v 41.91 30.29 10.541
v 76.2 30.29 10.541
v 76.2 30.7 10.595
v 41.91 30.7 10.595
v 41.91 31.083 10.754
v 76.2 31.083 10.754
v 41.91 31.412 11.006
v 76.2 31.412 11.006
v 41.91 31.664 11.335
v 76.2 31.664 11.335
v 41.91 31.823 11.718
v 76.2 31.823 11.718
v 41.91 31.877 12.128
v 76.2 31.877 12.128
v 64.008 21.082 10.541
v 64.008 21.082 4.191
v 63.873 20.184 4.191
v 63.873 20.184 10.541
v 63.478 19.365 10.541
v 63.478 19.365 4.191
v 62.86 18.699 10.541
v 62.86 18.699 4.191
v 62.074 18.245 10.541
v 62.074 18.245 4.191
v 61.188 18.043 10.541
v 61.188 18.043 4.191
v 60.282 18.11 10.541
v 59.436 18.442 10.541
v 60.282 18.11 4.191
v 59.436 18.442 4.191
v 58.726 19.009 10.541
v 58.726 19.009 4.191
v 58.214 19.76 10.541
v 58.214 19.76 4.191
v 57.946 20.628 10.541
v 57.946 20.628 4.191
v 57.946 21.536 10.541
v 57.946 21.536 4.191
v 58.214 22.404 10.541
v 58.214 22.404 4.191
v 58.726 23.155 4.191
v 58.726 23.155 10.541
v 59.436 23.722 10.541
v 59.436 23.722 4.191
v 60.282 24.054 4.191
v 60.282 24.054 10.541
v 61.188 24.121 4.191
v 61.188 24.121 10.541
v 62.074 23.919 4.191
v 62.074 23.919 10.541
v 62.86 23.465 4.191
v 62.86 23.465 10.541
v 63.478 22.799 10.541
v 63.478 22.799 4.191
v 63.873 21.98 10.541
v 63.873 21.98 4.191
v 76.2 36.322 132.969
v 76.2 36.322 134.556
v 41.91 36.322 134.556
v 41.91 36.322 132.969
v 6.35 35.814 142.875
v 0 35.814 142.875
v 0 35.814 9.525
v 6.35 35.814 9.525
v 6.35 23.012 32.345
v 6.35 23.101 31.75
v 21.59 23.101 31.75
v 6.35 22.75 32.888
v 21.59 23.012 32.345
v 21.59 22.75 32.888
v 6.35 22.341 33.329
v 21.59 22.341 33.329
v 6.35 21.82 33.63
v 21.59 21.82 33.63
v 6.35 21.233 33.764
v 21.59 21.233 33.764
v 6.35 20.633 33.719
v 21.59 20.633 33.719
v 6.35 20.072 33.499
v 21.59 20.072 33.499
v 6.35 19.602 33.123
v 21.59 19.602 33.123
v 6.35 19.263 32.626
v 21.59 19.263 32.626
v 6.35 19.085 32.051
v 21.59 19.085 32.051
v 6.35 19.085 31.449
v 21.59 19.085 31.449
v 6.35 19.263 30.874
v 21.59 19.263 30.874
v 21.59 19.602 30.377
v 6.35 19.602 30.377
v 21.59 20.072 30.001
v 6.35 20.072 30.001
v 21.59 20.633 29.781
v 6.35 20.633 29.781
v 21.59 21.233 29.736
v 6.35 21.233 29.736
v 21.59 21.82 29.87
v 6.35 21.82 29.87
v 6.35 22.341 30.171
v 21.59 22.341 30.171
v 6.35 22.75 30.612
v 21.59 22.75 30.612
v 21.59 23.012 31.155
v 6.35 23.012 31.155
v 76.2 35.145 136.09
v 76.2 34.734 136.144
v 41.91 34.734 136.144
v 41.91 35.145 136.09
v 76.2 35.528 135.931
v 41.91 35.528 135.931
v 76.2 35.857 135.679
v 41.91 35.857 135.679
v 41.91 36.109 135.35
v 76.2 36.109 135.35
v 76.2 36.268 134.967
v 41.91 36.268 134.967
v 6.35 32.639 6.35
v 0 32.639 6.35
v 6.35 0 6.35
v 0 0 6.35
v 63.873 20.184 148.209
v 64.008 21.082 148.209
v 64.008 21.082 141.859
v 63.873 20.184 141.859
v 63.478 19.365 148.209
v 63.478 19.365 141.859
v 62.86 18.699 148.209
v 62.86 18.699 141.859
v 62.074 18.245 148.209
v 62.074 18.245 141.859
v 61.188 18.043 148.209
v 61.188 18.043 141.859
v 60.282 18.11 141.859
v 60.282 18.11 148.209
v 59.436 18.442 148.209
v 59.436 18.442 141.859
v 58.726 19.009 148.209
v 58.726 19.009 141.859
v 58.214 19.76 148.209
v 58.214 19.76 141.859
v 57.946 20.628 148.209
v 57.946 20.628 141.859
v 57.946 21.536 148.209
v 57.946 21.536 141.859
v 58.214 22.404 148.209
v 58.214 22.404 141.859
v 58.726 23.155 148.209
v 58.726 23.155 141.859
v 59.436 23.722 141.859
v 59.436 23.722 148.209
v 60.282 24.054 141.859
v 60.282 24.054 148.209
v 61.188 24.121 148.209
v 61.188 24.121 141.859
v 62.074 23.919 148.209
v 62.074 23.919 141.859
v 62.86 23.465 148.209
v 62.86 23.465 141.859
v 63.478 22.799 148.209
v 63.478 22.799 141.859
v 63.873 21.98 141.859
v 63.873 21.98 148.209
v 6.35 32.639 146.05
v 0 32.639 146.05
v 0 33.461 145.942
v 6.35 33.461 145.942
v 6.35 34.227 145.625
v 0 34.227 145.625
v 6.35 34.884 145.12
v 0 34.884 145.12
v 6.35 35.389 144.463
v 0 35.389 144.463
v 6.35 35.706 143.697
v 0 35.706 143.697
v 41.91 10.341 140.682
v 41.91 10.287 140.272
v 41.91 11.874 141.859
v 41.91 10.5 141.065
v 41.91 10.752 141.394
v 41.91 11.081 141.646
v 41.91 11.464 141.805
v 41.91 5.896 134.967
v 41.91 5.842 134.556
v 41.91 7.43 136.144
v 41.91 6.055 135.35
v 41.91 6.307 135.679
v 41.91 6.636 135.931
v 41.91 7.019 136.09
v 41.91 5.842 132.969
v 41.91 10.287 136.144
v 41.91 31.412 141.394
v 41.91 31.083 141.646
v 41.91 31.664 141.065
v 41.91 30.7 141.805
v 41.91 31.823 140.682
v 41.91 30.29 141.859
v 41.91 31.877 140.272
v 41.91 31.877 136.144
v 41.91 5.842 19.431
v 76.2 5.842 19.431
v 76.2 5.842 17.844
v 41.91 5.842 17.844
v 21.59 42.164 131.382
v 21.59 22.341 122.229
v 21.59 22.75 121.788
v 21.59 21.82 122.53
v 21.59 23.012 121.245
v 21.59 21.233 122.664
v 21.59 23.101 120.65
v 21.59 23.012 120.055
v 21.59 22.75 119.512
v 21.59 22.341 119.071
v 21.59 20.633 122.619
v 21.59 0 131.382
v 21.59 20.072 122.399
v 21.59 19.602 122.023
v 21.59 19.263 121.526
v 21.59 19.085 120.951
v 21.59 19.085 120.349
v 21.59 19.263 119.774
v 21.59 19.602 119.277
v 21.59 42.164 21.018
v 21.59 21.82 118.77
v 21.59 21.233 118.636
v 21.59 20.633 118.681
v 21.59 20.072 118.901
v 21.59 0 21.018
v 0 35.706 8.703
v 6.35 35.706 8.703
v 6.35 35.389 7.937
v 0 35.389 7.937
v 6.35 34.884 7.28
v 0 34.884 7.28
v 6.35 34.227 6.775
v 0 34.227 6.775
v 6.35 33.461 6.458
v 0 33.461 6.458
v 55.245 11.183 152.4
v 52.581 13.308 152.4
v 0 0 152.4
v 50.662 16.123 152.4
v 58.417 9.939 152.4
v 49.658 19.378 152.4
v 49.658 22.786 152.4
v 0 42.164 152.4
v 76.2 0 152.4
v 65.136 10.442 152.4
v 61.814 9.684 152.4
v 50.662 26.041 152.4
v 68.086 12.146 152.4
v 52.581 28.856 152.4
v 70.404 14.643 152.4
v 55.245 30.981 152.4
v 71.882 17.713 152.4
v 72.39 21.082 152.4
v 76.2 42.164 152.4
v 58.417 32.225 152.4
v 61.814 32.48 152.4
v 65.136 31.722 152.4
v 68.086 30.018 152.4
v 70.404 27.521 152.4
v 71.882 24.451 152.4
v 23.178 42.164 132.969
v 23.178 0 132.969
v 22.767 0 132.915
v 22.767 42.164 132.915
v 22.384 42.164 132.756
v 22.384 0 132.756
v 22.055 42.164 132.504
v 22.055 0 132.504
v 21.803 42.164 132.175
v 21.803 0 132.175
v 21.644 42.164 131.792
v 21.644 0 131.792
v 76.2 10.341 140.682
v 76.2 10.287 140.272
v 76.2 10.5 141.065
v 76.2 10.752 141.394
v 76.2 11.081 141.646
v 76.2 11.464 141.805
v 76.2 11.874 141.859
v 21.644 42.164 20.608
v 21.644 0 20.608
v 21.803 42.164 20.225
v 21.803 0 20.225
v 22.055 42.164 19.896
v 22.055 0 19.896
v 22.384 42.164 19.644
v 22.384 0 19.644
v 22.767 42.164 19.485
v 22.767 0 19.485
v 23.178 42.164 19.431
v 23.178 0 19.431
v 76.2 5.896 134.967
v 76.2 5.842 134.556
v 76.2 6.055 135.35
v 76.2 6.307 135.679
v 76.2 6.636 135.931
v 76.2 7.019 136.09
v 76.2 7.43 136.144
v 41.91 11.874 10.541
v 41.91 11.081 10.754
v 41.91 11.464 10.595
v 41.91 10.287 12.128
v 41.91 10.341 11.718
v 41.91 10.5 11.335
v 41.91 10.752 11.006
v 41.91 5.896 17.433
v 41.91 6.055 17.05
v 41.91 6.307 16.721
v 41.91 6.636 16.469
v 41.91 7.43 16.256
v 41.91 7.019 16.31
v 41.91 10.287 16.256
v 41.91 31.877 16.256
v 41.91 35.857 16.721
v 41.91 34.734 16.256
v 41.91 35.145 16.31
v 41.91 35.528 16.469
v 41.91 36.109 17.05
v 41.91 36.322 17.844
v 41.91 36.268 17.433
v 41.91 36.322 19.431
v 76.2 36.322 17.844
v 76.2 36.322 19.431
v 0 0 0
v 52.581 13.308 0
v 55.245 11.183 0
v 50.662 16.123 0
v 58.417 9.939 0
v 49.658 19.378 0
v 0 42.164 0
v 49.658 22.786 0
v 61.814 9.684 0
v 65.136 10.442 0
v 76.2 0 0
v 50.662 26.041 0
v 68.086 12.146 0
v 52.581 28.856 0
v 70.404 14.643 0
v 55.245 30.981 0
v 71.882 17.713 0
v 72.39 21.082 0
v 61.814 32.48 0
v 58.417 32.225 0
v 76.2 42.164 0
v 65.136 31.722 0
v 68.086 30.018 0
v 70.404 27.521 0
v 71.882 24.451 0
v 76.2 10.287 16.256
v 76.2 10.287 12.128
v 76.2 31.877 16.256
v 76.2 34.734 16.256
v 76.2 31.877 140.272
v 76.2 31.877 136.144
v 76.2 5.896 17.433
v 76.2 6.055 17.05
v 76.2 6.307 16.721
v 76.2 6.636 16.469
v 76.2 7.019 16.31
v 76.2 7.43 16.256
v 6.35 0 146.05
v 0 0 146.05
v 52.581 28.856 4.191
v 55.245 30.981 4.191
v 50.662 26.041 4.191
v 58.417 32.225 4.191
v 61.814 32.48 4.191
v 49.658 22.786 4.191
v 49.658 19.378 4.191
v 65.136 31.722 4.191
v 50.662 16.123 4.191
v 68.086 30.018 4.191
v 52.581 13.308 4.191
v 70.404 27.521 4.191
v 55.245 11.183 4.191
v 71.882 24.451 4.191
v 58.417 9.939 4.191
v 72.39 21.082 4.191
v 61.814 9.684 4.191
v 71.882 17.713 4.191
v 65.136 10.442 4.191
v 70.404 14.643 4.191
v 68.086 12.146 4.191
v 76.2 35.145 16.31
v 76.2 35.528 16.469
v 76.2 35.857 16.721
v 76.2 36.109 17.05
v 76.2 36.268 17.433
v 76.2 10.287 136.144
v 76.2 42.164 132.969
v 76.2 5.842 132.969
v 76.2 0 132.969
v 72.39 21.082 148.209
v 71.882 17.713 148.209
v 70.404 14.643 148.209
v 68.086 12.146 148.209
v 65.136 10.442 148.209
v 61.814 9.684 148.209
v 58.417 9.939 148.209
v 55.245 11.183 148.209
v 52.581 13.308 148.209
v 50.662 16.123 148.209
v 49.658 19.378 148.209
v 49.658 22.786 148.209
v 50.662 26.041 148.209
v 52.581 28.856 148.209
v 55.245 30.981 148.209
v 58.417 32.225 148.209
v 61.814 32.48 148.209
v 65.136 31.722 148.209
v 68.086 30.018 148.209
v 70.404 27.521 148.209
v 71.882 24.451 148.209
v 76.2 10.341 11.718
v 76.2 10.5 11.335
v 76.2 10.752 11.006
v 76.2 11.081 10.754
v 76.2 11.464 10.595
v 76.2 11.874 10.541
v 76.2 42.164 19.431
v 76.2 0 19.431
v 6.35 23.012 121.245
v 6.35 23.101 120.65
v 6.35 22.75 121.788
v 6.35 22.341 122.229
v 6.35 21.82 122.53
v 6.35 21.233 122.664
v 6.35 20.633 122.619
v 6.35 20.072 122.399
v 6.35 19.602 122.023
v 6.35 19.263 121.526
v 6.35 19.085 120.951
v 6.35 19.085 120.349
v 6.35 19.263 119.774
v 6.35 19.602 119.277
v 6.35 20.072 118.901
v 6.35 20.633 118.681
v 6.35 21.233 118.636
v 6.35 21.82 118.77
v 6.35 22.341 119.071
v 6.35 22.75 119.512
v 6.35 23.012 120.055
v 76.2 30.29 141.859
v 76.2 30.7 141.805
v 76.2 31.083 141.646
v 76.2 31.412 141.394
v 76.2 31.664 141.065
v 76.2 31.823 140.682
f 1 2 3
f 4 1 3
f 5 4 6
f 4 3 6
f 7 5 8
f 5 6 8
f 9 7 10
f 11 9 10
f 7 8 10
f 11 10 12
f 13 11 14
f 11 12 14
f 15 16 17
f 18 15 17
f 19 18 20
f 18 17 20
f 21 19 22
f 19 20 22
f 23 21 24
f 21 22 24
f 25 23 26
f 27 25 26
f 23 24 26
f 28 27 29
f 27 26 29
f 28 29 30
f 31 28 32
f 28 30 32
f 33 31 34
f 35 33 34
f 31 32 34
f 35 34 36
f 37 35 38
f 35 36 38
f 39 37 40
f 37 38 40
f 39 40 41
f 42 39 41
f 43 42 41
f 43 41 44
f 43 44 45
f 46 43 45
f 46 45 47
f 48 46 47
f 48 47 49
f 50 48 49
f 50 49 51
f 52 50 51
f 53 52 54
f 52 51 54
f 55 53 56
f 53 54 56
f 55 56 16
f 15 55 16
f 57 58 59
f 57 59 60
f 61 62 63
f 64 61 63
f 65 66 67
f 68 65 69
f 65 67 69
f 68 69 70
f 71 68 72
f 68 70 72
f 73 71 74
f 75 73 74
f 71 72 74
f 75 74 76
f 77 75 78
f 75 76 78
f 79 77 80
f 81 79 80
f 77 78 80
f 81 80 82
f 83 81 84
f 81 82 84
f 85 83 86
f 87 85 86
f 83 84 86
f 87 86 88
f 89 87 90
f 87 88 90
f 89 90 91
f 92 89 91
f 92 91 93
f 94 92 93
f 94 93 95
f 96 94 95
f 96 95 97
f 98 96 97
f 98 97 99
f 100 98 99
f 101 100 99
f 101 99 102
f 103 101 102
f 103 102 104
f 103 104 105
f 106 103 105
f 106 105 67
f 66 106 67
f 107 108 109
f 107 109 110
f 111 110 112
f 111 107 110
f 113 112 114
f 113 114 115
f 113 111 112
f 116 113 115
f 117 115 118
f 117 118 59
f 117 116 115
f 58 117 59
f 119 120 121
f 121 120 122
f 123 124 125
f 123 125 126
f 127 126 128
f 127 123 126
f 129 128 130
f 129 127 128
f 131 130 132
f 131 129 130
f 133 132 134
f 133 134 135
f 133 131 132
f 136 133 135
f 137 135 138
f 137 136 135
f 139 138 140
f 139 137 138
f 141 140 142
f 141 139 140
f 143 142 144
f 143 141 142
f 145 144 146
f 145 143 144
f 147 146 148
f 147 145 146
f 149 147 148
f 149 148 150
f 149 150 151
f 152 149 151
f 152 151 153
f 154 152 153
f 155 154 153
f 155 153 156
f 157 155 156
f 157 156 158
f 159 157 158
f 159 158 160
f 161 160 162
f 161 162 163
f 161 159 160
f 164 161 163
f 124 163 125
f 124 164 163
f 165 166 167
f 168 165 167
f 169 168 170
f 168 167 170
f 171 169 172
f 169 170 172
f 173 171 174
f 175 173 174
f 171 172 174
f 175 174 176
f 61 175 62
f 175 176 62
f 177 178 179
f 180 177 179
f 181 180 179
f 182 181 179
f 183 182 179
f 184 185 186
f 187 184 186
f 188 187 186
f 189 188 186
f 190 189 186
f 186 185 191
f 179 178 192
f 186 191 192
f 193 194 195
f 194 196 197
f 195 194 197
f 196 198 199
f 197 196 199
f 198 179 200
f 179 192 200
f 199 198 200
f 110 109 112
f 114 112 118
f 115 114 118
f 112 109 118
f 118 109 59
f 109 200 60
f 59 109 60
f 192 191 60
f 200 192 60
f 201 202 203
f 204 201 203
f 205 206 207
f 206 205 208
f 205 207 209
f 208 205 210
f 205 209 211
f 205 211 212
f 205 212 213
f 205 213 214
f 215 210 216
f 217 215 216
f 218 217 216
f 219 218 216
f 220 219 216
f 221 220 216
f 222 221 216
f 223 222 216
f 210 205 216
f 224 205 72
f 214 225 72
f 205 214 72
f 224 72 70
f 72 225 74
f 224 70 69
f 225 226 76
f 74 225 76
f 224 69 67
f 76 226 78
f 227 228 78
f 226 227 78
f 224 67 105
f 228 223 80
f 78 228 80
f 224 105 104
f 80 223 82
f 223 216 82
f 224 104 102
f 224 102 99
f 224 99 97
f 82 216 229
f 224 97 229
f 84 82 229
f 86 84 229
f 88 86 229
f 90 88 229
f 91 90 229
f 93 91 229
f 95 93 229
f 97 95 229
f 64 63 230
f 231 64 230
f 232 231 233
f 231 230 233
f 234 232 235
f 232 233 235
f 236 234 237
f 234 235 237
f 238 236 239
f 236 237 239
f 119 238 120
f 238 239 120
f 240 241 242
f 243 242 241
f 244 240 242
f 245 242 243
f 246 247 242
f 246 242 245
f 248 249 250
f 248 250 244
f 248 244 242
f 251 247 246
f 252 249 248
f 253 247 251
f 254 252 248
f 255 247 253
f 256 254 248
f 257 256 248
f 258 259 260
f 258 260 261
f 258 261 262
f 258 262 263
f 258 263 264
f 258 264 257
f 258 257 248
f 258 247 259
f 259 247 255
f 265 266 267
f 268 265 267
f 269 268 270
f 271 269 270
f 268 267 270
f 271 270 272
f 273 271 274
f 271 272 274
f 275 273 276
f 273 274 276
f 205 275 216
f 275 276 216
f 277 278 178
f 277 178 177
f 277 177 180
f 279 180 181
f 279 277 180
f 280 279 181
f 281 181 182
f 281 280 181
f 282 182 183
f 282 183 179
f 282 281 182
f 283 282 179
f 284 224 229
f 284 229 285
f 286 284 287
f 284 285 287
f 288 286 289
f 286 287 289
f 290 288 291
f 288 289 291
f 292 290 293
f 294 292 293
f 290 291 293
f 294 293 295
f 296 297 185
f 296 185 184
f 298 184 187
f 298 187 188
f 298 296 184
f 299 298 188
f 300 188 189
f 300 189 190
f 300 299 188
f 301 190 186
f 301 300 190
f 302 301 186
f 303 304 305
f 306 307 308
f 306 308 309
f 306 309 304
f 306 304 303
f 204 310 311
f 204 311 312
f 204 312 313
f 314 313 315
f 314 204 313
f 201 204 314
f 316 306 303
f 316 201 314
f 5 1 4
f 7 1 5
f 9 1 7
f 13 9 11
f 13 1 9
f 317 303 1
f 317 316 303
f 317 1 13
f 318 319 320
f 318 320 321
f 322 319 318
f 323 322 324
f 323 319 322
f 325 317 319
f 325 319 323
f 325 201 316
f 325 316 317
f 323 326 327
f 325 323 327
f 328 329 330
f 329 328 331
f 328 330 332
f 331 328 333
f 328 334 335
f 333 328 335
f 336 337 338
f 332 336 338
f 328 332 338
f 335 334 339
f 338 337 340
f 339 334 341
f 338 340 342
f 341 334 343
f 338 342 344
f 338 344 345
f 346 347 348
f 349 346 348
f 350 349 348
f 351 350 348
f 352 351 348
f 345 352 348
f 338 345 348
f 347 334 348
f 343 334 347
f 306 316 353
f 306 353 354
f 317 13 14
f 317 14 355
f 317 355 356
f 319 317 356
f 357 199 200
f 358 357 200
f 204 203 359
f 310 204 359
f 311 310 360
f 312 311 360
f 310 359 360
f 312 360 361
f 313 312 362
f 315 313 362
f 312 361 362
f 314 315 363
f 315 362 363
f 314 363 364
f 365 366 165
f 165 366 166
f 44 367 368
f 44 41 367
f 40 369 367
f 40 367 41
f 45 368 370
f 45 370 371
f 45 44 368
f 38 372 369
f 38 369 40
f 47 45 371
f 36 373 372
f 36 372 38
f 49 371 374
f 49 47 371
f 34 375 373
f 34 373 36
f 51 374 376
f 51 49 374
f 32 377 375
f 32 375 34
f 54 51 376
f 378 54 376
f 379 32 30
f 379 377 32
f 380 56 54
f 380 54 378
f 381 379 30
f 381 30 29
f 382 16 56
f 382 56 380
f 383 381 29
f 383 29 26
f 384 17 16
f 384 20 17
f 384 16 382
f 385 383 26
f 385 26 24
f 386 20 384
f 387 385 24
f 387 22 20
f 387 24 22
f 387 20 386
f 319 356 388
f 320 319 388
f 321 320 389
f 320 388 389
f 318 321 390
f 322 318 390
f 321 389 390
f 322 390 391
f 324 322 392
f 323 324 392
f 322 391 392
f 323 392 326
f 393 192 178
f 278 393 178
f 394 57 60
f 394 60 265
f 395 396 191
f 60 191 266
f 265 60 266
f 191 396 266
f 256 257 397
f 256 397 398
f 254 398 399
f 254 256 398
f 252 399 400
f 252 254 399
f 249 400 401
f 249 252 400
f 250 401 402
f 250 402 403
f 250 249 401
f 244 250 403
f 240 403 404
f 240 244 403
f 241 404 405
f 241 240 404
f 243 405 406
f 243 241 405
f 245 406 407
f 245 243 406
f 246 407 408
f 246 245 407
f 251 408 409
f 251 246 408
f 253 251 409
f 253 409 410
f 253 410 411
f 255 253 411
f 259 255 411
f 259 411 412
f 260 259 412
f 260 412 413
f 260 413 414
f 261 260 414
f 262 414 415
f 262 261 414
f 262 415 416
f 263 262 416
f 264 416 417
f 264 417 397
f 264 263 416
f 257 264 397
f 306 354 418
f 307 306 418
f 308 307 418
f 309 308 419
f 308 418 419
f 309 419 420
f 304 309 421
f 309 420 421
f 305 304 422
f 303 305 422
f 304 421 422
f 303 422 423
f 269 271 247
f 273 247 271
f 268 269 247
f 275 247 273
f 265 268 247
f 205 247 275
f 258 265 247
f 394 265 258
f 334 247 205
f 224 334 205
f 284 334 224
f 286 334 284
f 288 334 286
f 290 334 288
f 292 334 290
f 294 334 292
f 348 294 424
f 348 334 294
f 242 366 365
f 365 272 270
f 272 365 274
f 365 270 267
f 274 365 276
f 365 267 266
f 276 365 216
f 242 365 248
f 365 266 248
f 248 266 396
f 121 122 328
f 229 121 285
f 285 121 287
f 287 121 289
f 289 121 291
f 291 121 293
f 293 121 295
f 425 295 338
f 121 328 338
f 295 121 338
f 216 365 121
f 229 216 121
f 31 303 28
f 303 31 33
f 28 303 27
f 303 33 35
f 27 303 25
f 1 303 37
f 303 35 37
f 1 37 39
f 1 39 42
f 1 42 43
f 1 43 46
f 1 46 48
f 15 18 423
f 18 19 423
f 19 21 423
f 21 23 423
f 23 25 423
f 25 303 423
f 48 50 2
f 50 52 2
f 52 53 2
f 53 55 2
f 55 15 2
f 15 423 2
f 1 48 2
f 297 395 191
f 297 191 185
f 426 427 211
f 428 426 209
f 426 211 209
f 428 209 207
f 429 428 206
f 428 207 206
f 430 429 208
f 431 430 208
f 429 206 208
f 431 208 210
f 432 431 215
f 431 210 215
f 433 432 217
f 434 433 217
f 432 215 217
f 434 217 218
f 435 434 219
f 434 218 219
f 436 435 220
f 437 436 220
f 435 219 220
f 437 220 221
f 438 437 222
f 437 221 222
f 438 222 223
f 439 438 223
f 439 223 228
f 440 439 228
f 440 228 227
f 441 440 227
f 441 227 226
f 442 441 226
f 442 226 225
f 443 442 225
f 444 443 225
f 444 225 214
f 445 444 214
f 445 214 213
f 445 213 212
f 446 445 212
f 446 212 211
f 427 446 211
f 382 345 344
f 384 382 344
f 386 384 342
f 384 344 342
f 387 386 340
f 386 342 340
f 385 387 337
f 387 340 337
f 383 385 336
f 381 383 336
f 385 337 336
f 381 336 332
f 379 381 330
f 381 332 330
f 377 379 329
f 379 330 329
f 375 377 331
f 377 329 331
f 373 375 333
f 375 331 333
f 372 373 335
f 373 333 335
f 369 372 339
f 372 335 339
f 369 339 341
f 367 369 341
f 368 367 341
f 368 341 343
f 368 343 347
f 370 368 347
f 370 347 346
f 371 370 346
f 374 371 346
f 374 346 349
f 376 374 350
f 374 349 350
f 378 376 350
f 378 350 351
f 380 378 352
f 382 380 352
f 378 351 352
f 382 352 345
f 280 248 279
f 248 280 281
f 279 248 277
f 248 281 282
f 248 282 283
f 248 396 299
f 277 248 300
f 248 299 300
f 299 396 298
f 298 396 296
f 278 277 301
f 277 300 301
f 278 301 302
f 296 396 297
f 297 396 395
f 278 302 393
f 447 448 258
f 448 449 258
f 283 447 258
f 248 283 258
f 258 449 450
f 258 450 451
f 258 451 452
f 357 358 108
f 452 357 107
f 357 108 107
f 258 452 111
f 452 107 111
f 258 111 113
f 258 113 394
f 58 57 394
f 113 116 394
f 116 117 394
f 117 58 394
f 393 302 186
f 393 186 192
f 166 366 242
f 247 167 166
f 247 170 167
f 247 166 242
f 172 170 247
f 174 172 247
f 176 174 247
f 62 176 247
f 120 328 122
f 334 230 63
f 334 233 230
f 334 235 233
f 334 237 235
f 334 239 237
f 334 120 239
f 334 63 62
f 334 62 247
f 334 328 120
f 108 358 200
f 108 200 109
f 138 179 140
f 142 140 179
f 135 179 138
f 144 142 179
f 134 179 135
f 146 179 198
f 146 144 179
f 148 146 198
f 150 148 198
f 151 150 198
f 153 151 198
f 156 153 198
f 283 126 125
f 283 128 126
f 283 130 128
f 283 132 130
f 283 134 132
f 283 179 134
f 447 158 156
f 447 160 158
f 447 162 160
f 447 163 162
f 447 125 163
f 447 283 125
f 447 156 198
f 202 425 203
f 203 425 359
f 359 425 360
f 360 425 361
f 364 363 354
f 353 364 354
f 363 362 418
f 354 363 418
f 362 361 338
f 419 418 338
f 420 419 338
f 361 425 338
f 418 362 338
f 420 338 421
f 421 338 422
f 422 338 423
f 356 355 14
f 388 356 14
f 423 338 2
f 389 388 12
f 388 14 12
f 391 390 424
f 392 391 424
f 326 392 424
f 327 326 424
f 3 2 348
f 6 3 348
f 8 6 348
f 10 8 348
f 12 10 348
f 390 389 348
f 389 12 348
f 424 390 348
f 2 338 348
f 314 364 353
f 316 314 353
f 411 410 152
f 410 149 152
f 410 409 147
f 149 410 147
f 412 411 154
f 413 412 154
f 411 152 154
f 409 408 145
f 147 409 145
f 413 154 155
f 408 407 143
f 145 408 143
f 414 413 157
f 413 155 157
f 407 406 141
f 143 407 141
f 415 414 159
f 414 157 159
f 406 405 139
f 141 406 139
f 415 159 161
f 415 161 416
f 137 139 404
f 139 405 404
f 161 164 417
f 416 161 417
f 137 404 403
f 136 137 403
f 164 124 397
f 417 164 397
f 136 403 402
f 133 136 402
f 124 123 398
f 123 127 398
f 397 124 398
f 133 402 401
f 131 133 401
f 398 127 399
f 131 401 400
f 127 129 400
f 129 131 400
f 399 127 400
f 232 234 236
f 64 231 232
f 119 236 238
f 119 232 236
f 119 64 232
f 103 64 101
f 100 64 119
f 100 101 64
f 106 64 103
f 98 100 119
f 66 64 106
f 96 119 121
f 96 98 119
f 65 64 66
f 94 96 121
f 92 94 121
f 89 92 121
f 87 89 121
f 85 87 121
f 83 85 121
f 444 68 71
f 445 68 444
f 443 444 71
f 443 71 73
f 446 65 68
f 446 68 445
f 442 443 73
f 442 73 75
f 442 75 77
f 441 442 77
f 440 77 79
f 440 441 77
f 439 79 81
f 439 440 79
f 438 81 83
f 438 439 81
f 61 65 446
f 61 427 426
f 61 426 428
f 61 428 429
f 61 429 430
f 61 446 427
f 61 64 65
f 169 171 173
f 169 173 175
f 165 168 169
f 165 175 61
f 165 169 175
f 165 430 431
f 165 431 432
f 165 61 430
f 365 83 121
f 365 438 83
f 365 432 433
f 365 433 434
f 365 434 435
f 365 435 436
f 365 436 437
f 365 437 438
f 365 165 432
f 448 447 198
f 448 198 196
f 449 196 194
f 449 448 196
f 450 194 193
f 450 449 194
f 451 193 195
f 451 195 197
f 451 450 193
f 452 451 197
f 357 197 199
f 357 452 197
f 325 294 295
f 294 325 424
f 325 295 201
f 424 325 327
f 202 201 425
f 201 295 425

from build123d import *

# Parameters (mm, degrees)
F0_W      = 76.2
F0_H      = 42.164
F1_DEPTH  = 152.4
F3_DEPTH  = 42.165
F5_DEPTH  = 34.29
F7_R      = 11.43
F8_DEPTH  = 4.191
F9_R      = 3.048
F10_DEPTH = 6.35
F12_DEPTH = 6.35
F14_D     = 4.0386


# Not quite as in the source:
# - a pattern or mirror of a feature is missing from the dataset's text; its kind, count and spacing are read off the source's solid


with BuildPart() as f1:
    # F0 (on Top) → F1 (new body)
    with BuildSketch(Plane.XY):
        with Locations((38.1, 21.082)):
            Rectangle(F0_W, F0_H)
    extrude(amount=F1_DEPTH)

    # F2 (on face) → F3 (cut, through all)
    with BuildSketch(Plane.XZ):
        with BuildLine():
            Line((23.1775, 19.431), (76.2, 19.431))
            Line((76.2, 19.431), (76.2, 132.969))
            Line((76.2, 132.969), (23.1775, 132.969))
            ThreePointArc((23.1775, 132.969), (22.0549679849, 132.5040320151), (21.59, 131.3815))
            Line((21.59, 131.3815), (21.59, 21.0185))
            ThreePointArc((21.59, 21.0185), (22.0549679849, 19.8959679849), (23.1775, 19.431))
        make_face()
    extrude(amount=-F3_DEPTH, mode=Mode.SUBTRACT)

    # F4 (on face) → F5 (cut)
    with BuildSketch(Plane.YZ.offset(76.2)):
        with BuildLine():
            Line((36.322, 17.8435), (36.322, 19.431))
            Line((36.322, 19.431), (5.842, 19.431))
            Line((5.842, 19.431), (5.842, 17.8435))
            ThreePointArc((5.842, 17.8435), (6.3069679849, 16.7209679849), (7.4295, 16.256))
            Line((7.4295, 16.256), (10.287, 16.256))
            Line((10.287, 16.256), (10.287, 12.1285))
            ThreePointArc((10.287, 12.1285), (10.7519679849, 11.0059679849), (11.8745, 10.541))
            Line((11.8745, 10.541), (30.2895, 10.541))
            ThreePointArc((30.2895, 10.541), (31.4120320151, 11.0059679849), (31.877, 12.1285))
            Line((31.877, 12.1285), (31.877, 16.256))
            Line((31.877, 16.256), (34.7345, 16.256))
            ThreePointArc((34.7345, 16.256), (35.8570320151, 16.7209679849), (36.322, 17.8435))
        make_face()
    f5 = extrude(amount=-F5_DEPTH, mode=Mode.SUBTRACT)

    # F5_copies: F5 across plane
    add(f5.mirror(Plane.XY.offset(76.2)), mode=Mode.SUBTRACT)

    # F7 (on face) → F8 (cut)
    with BuildSketch(Plane(origin=(0, 0, 0), x_dir=(1, 0, 0), z_dir=(0, 0, -1))):
        with Locations((60.96, -21.082)):
            Circle(F7_R)
    f8 = extrude(amount=-F8_DEPTH, mode=Mode.SUBTRACT)

    # F8_copies: F8 across plane
    add(f8.mirror(Plane.XY.offset(76.2)), mode=Mode.SUBTRACT)

    # F9 (on face) → F10 (cut, through all)
    with BuildSketch(Plane(origin=(0, 0, 4.191), x_dir=(1, 0, 0), z_dir=(0, 0, -1))):
        with Locations((60.96, -21.082)):
            Circle(F9_R)
    f10 = extrude(amount=-F10_DEPTH, mode=Mode.SUBTRACT)

    # F10_copies: F10 across plane
    add(f10.mirror(Plane.XY.offset(76.2)), mode=Mode.SUBTRACT)

    # F11 (on face) → F12 (cut)
    with BuildSketch(Plane(origin=(0, 0, 0), x_dir=(0, -1, 0), z_dir=(-1, 0, 0))):
        with BuildLine():
            Line((-32.639, 6.35), (0, 6.35))
            Line((0, 6.35), (0, 146.05))
            Line((0, 146.05), (-32.639, 146.05))
            ThreePointArc((-32.639, 146.05), (-34.8840640303, 145.1200640303), (-35.814, 142.875))
            Line((-35.814, 142.875), (-35.814, 9.525))
            ThreePointArc((-35.814, 9.525), (-34.8840640303, 7.2799359697), (-32.639, 6.35))
        make_face()
    extrude(amount=-F12_DEPTH, mode=Mode.SUBTRACT)

    # F14 (through all)
    with Locations(Plane(origin=(6.35, 0, 0), x_dir=(0, -1, 0), z_dir=(-1, 0, 0))):
        with Locations((-21.082, 120.65), (-21.082, 31.75)):
            Hole(F14_D / 2)


solid = f1.part
